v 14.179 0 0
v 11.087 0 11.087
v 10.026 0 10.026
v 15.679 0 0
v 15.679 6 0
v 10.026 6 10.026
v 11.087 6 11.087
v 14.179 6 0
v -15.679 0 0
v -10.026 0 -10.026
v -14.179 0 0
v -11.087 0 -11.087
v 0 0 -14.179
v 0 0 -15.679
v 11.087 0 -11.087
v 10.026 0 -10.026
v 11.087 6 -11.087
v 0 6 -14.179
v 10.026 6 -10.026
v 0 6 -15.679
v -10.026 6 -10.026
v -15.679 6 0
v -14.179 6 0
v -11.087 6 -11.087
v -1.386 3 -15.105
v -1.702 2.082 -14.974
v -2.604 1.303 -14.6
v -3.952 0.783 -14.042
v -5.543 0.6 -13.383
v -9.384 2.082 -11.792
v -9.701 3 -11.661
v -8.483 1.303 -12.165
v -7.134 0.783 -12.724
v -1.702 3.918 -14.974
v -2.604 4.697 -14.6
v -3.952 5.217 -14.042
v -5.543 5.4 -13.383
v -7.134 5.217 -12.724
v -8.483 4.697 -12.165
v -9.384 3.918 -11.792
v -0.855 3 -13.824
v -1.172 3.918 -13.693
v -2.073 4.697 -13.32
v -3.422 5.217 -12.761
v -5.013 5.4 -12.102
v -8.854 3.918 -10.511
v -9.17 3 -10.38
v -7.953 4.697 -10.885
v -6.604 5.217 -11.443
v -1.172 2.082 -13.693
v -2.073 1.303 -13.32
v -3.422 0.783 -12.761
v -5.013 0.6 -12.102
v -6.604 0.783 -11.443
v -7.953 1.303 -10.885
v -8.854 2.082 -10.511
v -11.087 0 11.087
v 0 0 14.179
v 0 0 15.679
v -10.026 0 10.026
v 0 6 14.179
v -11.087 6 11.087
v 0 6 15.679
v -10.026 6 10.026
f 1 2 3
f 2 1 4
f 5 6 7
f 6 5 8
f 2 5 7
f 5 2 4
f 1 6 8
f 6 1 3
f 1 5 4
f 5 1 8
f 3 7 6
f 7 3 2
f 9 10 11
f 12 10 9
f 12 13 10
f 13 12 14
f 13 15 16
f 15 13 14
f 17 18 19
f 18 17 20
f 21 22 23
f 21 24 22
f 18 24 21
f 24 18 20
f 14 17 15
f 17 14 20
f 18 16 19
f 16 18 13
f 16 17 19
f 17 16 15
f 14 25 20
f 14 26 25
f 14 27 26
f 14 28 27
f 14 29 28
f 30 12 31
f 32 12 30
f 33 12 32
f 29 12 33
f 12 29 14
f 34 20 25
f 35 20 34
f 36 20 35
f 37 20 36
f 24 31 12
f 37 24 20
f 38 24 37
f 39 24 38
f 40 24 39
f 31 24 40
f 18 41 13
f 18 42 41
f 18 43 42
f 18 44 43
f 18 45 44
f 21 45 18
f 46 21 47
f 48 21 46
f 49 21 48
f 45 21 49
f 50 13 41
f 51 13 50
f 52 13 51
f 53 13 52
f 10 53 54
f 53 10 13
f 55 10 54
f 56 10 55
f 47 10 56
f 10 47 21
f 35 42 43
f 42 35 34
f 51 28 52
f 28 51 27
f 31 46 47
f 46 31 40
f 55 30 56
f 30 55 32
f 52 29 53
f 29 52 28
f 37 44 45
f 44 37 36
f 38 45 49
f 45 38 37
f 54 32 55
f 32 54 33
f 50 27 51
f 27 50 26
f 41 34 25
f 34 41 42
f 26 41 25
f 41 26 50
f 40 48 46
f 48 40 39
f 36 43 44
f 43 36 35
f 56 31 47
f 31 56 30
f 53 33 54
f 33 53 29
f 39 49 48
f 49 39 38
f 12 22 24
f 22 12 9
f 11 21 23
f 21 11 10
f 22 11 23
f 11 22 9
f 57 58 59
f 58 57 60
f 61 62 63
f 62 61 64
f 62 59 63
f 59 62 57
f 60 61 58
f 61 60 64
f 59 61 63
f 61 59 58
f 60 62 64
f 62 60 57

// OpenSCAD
//
//
//

inner_radius = 24;
outer_radius = 36;
tower_height = 20;
thickness = 3;

walkway_length = 8;

third_floor_slice_count = 8; // this indirectly controls the size of the pad
third_floor_slice_sweep = 360 / third_floor_slice_count;

width = outer_radius - inner_radius;
third_floor_radius = (width / 2) / sin(third_floor_slice_sweep / 2);
third_floor_edge_radius = cos(third_floor_slice_sweep / 2) * third_floor_radius;

wall_thickness = 1.5;
wall_height = 6;


module make_third_floor() {
    union() {
        for (rotational_index=[0:1:third_floor_slice_count-1]) {
            start_angle = (360.0 / third_floor_slice_count) * rotational_index;
            end_angle = (360.0 / third_floor_slice_count) * (rotational_index + 1);

            p03x = 0;
            p03y = 0 - thickness;
            p03z = 0;

            p12x = 0;
            p12y = 0;
            p12z = 0;

            p4x = third_floor_radius * sin(start_angle);
            p4y = 0 - thickness;
            p4z = third_floor_radius * cos(start_angle);

            p5x = third_floor_radius * sin(start_angle);
            p5y = 0;
            p5z = third_floor_radius * cos(start_angle);

            p6x = third_floor_radius * sin(end_angle);
            p6y = 0;
            p6z = third_floor_radius * cos(end_angle);

            p7x = third_floor_radius * sin(end_angle);
            p7y =  0 - thickness;
            p7z = third_floor_radius * cos(end_angle);

            section_points = [[p03x, p03y, p03z], // 0
                              [p12x, p12y, p12z], // 1
                              [p4x, p4y, p4z], // 2
                              [p5x, p5y, p5z], // 3
                              [p6x, p6y, p6z], // 4
                              [p7x, p7y, p7z]]; // 5
            polyhedron(points=section_points,
                       faces=[[0, 5, 2], // bottom
                              [1, 3, 4], // top
                              [2, 5, 4, 3]]); // outside
        }
    }
}

module make_wall(rotational_index, window) {
    start_angle = (360.0 / third_floor_slice_count) * rotational_index;
    end_angle = (360.0 / third_floor_slice_count) * (rotational_index + 1);
    mid_angle = (start_angle + end_angle) / 2;

    if (rotational_index == 1 ||
        rotational_index == 3 ||
        rotational_index == 4 ||
        rotational_index == 5 ||
        rotational_index == 7) {
        difference() {
            union() {
                p5x = third_floor_radius * sin(start_angle);
                p5y = 0;
                p5z = third_floor_radius * cos(start_angle);

                p6x = third_floor_radius * sin(end_angle);
                p6y = 0;
                p6z = third_floor_radius * cos(end_angle);

                p8x = (third_floor_radius - wall_thickness) * sin(start_angle);
                p8y = 0;
                p8z = (third_floor_radius - wall_thickness) * cos(start_angle);

                p9x = (third_floor_radius - wall_thickness) * sin(end_angle);
                p9y = 0;
                p9z = (third_floor_radius - wall_thickness) * cos(end_angle);

                p10x = p6x;
                p10y = p6y + wall_height;
                p10z = p6z;

                p11x = p8x;
                p11y = p8y + wall_height;
                p11z = p8z;

                p12x = p9x;
                p12y = p9y + wall_height;
                p12z = p9z;

                p13x = p5x;
                p13y = p5y + wall_height;
                p13z = p5z;

                wall_points = [[p5x, p5y, p5z], // 0
                               [p6x, p6y, p6z], // 1
                               [p8x, p8y, p8z], // 2
                               [p9x, p9y, p9z], // 3
                               [p10x, p10y, p10z], // 4
                               [p11x, p11y, p11z], // 5
                               [p12x, p12y, p12z], // 6
                               [p13x, p13y, p13z]]; // 7

                polyhedron(points=wall_points,
                           faces=[[2, 3, 1, 0], // bottom
                                  [4, 6, 5, 7], // top
                                  [0, 1, 4, 7], // outside
                                  [2, 5, 6, 3], // inside
                                  [6, 4, 1, 3], // left
                                  [2, 0, 7, 5] // right
                               ]);
            }

            union() {
                if (rotational_index == 4 && window) {
                    rotate([0, mid_angle, 0]) {
                        translate([0, wall_height / 2, third_floor_radius - 1]) {
                            scale([1.5, 0.8, 1]) {
                                cylinder(h = wall_thickness*5, r1 = wall_height/2, r2 = wall_height/2, center = true, $fn=16);
                            }
                        }
                    }
                }
            }
        }
    }
}


nth = 0;  // this is overridden by Makefile

echo(nth=nth);

if (nth == 0 || nth == 1) {
    make_third_floor();
}

if (nth == 0) {
    union() {
        for (rotational_index=[0:1:third_floor_slice_count-1]) {
            make_wall(rotational_index, true);
        }
    }
} else if (nth >= 2 && nth <= 9) {
    make_wall(nth - 2, false);
}

if (nth == 0 || nth == 10) {
    translate([0, wall_height + thickness, 0]) {
        make_third_floor();
    }
}
